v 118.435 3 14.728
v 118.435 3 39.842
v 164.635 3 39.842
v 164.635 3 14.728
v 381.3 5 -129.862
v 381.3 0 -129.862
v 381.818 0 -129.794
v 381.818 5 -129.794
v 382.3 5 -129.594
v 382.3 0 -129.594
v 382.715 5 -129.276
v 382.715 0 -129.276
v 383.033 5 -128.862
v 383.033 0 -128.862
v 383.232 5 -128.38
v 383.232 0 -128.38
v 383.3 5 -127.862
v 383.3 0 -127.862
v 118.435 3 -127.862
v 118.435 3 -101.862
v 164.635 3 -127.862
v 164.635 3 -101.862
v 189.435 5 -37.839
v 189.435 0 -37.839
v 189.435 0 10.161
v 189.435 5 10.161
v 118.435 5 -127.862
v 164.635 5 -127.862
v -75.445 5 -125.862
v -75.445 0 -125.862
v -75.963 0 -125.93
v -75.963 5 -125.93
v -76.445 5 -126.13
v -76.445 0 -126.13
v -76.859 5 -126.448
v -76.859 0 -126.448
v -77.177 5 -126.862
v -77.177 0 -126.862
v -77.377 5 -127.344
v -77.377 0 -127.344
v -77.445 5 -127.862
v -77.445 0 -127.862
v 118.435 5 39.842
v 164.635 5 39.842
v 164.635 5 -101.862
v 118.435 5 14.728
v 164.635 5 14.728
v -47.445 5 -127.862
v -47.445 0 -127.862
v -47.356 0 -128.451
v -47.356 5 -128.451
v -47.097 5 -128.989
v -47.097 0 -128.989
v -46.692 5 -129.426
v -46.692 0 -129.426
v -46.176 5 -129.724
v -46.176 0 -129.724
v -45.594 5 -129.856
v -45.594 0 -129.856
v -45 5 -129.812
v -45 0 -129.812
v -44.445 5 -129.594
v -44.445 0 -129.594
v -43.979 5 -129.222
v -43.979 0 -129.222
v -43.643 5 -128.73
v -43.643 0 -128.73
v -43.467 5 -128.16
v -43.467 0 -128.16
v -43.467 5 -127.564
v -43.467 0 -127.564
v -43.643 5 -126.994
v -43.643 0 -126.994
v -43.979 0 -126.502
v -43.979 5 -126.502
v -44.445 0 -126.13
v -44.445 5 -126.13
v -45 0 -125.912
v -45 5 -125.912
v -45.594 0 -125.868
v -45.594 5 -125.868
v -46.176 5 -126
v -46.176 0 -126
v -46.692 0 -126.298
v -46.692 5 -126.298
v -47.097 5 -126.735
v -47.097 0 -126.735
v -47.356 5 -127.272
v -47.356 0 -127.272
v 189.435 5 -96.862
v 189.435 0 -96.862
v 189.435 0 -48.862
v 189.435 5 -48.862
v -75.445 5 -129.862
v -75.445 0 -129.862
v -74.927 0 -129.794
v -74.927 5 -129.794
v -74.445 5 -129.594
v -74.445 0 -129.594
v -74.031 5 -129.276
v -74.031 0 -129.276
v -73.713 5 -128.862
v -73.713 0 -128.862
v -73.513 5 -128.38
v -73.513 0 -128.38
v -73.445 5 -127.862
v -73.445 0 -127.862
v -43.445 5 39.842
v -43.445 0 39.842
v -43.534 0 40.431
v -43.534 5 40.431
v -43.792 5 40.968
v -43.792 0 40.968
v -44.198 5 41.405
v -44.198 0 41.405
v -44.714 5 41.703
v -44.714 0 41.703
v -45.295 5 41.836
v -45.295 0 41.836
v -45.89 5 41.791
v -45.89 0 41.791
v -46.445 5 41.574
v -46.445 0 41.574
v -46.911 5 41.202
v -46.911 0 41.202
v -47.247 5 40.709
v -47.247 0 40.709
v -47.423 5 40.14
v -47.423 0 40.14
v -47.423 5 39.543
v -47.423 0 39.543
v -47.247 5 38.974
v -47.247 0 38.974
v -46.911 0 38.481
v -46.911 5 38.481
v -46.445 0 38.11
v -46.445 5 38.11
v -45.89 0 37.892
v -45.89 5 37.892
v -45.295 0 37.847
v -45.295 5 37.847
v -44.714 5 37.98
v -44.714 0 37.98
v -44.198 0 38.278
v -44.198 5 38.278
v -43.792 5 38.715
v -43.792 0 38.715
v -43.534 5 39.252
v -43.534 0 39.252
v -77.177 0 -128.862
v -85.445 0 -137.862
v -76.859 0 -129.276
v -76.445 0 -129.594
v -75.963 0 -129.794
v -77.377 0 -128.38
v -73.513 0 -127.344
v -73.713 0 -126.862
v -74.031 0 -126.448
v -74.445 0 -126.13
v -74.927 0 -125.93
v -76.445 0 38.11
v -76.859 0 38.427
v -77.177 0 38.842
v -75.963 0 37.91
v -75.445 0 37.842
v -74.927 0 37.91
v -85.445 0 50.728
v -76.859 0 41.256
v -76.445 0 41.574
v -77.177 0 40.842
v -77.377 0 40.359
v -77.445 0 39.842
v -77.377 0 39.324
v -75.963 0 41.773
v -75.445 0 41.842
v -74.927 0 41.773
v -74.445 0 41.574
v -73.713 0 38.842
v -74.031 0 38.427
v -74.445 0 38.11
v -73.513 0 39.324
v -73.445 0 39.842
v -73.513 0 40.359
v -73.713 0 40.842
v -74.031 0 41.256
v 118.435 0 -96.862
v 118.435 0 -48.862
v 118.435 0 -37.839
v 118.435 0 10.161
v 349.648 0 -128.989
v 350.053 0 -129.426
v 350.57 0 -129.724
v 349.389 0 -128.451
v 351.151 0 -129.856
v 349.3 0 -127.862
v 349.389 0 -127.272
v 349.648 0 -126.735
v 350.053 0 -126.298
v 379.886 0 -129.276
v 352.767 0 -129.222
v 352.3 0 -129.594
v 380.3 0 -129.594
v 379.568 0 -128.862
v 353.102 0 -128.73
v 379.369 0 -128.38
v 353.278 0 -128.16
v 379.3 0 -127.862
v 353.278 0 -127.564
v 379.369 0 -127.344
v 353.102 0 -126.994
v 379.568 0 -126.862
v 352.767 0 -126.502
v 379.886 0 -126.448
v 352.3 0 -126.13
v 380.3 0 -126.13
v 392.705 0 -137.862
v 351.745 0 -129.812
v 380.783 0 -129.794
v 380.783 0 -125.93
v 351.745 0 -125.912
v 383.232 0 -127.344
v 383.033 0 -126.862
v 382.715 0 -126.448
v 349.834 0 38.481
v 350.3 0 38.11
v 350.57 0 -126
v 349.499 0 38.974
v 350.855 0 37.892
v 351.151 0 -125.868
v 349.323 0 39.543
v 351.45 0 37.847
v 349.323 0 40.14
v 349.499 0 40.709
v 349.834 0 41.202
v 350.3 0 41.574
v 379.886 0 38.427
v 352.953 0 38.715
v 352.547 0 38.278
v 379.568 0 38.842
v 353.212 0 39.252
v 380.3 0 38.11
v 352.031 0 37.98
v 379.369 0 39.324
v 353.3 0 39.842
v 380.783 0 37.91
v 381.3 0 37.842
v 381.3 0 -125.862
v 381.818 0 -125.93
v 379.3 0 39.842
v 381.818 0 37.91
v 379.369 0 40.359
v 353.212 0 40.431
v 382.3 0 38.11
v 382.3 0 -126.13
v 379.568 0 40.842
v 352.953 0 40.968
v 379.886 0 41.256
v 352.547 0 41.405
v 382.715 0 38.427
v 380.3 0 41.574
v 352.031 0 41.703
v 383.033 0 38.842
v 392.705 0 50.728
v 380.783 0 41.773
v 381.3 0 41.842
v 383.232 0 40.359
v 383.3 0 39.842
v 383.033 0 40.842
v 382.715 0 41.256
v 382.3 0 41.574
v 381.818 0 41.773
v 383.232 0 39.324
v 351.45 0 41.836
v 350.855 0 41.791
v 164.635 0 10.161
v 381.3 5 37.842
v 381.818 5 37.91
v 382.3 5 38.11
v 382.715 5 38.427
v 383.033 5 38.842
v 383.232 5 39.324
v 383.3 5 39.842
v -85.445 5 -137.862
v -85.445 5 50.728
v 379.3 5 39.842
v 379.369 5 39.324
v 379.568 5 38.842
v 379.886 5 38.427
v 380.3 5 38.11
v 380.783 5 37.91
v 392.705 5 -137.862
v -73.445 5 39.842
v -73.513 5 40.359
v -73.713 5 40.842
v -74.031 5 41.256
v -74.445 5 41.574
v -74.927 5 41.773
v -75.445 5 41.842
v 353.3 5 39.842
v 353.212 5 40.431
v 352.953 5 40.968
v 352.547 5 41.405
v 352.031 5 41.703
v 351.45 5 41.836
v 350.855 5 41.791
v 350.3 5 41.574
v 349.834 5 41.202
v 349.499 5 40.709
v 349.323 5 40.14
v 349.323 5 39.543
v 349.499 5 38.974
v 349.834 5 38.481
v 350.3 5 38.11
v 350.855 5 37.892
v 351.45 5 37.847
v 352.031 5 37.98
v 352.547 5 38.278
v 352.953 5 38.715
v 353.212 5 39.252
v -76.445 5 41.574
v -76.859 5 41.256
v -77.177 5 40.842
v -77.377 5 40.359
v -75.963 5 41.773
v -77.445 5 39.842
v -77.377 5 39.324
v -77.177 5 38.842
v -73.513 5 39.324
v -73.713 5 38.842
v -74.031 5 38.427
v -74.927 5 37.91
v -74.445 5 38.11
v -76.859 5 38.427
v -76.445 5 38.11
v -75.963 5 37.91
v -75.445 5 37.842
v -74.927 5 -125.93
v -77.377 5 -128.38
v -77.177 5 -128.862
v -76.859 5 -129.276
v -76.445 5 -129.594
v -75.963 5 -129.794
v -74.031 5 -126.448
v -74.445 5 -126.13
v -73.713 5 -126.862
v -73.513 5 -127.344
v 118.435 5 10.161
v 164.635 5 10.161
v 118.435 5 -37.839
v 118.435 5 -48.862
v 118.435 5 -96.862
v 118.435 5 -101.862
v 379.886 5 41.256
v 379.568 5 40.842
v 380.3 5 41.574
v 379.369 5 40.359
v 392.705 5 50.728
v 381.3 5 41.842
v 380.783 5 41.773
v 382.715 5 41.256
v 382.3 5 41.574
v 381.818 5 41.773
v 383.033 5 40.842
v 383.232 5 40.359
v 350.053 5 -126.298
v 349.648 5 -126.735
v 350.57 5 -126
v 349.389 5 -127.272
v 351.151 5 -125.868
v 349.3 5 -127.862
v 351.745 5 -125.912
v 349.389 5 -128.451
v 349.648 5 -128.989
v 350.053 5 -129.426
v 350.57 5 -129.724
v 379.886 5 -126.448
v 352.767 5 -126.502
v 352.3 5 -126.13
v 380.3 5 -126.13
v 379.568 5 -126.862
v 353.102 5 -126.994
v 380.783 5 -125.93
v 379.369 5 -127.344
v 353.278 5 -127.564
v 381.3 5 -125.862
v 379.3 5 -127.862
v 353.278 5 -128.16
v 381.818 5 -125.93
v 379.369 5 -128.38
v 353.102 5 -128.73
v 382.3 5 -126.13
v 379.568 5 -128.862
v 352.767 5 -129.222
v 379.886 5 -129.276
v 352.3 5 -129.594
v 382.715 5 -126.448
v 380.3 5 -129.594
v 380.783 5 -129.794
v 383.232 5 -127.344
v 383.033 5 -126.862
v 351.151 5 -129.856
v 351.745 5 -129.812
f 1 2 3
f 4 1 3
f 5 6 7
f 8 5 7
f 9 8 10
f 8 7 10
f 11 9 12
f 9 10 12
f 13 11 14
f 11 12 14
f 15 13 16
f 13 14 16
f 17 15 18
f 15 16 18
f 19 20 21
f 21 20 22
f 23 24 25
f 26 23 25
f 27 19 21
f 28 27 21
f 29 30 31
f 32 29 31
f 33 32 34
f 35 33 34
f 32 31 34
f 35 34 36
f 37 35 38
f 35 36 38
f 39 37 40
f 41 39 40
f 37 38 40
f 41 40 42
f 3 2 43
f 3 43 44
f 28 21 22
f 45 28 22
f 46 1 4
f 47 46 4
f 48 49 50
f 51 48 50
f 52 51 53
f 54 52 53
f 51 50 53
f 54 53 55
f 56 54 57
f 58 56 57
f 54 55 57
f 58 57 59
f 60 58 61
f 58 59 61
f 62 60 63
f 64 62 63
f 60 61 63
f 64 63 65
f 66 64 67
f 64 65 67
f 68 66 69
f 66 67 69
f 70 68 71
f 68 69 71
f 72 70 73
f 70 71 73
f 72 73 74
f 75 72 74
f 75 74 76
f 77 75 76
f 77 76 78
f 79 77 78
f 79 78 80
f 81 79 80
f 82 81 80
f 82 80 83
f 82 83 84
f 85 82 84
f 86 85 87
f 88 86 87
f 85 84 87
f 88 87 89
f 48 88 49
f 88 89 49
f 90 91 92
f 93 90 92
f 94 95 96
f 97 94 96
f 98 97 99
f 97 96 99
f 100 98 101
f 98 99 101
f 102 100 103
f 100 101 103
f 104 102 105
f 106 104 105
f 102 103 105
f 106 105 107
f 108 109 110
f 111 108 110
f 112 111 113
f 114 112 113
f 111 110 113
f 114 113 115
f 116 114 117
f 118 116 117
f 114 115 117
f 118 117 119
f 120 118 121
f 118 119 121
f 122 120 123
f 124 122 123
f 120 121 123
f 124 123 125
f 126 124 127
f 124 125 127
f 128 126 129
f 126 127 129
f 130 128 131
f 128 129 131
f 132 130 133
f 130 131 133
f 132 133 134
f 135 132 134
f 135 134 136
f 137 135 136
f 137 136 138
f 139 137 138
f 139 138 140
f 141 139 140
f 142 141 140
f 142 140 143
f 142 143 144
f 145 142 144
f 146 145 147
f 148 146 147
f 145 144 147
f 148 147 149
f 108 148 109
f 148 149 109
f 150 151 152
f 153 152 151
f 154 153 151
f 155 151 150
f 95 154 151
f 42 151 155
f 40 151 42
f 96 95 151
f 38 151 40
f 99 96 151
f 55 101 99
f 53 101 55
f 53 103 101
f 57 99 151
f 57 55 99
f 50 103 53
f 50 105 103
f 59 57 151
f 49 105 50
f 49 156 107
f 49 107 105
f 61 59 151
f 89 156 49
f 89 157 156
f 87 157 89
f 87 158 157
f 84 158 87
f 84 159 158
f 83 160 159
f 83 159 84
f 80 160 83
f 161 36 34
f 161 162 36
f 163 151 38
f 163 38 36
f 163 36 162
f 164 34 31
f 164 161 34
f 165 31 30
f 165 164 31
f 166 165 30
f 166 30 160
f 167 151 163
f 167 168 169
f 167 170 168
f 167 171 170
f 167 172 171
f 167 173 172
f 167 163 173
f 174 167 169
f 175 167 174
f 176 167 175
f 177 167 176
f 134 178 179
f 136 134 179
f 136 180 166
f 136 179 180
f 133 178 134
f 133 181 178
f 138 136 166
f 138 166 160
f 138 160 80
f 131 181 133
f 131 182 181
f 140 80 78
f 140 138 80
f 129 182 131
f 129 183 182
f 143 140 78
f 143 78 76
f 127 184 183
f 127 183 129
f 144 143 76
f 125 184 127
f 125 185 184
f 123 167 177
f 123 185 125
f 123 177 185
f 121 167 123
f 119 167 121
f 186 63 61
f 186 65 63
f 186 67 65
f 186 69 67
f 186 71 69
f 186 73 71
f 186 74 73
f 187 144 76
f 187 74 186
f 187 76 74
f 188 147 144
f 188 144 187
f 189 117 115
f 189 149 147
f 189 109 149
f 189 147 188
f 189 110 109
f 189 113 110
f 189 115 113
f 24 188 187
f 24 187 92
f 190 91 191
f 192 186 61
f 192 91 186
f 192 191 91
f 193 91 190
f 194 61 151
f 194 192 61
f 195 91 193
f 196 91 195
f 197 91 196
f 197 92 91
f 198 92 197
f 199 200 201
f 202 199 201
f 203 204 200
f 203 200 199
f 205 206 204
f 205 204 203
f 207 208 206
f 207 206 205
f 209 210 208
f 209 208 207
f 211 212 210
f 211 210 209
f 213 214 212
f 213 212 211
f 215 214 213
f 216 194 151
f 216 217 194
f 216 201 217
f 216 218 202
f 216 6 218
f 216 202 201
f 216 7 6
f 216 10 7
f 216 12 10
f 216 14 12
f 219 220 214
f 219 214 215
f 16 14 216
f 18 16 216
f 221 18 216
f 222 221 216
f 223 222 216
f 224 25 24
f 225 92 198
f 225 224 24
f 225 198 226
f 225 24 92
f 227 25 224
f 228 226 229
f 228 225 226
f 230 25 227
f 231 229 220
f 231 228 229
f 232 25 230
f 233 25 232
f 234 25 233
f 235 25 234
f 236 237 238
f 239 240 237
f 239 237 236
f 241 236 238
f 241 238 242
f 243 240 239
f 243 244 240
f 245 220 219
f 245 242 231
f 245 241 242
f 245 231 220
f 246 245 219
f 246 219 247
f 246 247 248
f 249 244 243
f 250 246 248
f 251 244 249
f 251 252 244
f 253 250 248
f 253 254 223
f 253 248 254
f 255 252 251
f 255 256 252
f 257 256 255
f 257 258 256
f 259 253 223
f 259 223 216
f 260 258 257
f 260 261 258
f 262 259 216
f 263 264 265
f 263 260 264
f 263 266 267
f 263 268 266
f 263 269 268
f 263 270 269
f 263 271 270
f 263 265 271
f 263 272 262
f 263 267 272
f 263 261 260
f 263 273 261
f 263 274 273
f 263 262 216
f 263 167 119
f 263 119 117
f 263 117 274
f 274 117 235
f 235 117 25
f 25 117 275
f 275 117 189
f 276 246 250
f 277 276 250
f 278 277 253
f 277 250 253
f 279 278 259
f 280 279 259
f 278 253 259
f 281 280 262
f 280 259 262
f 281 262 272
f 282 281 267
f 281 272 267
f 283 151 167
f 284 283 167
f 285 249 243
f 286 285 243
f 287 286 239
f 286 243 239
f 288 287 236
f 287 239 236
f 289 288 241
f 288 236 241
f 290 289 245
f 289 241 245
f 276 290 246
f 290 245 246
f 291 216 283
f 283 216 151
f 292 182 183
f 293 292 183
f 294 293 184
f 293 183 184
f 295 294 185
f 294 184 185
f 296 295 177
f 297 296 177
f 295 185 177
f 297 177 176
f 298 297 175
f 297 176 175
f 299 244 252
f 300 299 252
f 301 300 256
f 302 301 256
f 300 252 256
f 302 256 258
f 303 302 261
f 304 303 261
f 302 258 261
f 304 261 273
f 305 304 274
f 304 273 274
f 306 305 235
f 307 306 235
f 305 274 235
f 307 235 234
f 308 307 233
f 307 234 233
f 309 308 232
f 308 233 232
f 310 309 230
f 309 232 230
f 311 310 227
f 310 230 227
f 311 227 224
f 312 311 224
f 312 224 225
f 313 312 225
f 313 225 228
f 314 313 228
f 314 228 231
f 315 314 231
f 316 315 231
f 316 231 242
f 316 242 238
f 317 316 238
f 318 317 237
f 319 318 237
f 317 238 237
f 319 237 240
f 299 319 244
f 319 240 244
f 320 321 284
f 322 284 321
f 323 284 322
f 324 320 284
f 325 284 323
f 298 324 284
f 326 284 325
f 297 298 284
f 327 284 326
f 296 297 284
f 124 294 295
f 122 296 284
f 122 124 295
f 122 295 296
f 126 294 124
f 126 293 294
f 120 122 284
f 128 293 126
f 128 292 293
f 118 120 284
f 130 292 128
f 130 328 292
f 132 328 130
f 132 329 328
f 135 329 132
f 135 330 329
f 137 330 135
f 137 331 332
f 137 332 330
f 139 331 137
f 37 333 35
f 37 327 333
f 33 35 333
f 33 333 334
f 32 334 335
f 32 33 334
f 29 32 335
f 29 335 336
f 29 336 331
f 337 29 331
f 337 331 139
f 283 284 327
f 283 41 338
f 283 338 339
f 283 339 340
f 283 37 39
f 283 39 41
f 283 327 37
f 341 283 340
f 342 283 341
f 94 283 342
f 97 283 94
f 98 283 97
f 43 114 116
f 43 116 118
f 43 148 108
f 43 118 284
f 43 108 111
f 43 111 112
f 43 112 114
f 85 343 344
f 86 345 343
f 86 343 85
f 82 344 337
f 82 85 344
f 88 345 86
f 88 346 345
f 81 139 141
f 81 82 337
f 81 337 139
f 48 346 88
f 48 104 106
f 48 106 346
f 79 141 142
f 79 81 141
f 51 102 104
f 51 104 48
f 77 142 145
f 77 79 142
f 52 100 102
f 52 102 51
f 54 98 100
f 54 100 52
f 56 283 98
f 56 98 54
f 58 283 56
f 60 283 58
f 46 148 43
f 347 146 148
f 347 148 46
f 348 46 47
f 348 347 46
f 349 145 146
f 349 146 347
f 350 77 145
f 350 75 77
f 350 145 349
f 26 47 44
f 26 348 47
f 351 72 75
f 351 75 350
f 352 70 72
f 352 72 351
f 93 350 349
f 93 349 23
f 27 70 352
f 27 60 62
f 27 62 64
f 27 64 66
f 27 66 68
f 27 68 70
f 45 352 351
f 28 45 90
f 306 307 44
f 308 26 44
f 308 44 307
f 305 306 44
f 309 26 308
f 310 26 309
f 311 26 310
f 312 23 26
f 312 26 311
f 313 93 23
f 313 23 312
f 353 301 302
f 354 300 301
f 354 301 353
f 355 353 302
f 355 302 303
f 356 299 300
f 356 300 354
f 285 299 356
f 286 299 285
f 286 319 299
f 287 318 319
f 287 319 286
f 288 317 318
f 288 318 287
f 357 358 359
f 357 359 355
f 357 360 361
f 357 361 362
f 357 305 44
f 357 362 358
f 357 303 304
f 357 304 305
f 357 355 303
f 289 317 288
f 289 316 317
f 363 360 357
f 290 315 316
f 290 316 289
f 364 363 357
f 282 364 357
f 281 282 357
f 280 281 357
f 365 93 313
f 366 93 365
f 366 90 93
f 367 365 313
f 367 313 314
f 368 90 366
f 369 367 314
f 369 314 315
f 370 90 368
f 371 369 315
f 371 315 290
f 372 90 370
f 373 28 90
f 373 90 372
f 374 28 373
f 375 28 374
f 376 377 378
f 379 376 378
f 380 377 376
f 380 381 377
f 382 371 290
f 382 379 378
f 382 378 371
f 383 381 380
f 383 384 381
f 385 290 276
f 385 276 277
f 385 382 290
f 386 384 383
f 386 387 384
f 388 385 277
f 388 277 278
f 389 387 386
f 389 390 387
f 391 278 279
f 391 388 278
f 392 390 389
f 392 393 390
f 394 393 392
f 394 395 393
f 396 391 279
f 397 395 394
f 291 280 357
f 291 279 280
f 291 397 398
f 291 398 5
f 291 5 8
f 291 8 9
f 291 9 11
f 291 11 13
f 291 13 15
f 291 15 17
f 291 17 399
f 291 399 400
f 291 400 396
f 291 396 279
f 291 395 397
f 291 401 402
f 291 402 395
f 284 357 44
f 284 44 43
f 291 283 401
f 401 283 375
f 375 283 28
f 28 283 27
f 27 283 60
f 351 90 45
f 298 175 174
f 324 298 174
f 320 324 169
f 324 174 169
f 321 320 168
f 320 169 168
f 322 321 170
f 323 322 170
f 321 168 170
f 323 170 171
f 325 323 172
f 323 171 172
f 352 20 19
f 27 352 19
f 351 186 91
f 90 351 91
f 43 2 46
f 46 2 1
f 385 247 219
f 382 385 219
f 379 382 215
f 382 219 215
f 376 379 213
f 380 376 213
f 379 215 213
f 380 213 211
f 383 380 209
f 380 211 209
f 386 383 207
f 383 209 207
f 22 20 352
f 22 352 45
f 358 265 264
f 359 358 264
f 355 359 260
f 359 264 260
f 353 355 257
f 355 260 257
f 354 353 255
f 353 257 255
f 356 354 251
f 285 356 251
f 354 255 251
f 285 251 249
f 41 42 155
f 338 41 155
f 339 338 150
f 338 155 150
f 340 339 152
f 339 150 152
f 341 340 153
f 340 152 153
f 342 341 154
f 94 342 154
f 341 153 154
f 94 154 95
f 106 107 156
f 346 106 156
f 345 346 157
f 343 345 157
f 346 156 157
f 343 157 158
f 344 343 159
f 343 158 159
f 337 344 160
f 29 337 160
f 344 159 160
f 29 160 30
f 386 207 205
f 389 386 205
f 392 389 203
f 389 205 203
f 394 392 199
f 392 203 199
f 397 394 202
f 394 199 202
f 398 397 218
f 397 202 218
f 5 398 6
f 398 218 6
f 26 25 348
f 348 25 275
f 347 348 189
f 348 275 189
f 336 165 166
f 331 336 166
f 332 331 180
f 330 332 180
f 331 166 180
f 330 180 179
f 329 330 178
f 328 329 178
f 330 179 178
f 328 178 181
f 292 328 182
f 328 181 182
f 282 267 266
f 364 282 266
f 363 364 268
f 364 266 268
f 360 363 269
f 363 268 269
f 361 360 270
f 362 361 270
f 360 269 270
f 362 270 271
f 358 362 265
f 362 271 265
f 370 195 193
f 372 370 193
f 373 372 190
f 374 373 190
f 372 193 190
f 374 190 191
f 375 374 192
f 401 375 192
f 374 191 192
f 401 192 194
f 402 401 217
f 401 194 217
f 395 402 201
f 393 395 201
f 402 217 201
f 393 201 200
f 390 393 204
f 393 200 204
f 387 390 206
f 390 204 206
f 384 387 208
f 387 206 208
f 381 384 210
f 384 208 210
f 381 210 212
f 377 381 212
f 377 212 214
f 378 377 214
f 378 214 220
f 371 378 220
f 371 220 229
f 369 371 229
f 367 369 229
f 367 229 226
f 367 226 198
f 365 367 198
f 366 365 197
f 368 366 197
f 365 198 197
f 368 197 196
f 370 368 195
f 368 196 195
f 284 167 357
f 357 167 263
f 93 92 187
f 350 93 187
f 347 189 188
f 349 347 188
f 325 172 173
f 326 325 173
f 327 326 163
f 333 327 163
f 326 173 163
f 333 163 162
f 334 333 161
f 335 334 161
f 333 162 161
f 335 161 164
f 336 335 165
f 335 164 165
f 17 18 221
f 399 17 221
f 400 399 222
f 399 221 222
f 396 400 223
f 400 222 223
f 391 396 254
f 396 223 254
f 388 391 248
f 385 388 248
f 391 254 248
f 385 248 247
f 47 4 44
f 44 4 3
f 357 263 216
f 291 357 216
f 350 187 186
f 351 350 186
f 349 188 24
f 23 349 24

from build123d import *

# Parameters (mm, degrees)
ESQUISSE2_W        = 46.2
ESQUISSE2_H        = 5
ESQUISSE2_H_2      = 8
ESQUISSE2_H_3      = 8.88649877
ESQUISSE2_H_4      = 2
ESQUISSE2_H_5      = 4.567327767
BOSS_EXTRU_1_DEPTH = 5
ESQUISSE3_W        = 46.2
ESQUISSE3_H        = 25.11350123
ESQUISSE3_H_2      = 26
BOSS_EXTRU_2_DEPTH = 3


with BuildPart() as part:
    # Esquisse2 → Boss.-Extru.1 (new body)
    with BuildSketch(Plane(origin=(0, 0, 0), x_dir=(1, 0, 0), z_dir=(0, 1, 0))):
        with BuildLine():
            Line((-75.44494324, 137.861939651), (-85.44494324, 137.861939651))
            Line((-85.44494324, 137.861939651), (-85.44494324, 127.861939651))
            Line((-85.44494324, 127.861939651), (-77.44494324, 127.861939651))
            ThreePointArc((-77.44494324, 127.861939651), (-76.859156802, 129.276153213), (-75.44494324, 129.861939651))
            Line((-75.44494324, 129.861939651), (-75.44494324, 137.861939651))
        make_face()
        with BuildLine():
            Line((-77.44494324, 127.861939651), (-85.44494324, 127.861939651))
            Line((-85.44494324, 127.861939651), (-85.44494324, -39.841561579))
            Line((-85.44494324, -39.841561579), (-77.44494324, -39.841561579))
            ThreePointArc((-77.44494324, -39.841561579), (-76.859156802, -38.427348016), (-75.44494324, -37.841561579))
            Line((-75.44494324, -37.841561579), (-75.44494324, 125.861939651))
            ThreePointArc((-75.44494324, 125.861939651), (-76.859156802, 126.447726088), (-77.44494324, 127.861939651))
        make_face()
        with BuildLine():
            Line((-70.44494324, 127.861939651), (-73.44494324, 127.861939651))
            ThreePointArc((-73.44494324, 127.861939651), (-74.030729678, 126.447726088), (-75.44494324, 125.861939651))
            Line((-75.44494324, 125.861939651), (-75.44494324, -37.841561579))
            ThreePointArc((-75.44494324, -37.841561579), (-74.030729678, -38.427348016), (-73.44494324, -39.841561579))
            Line((-73.44494324, -39.841561579), (-70.44494324, -39.841561579))
            Line((-70.44494324, -39.841561579), (-70.44494324, 127.861939651))
        make_face()
        with BuildLine():
            Line((118.43505676, 101.861939651), (118.43505676, 127.861939651))
            Line((118.43505676, 127.861939651), (-43.44494324, 127.861939651))
            ThreePointArc((-43.44494324, 127.861939651), (-45.44494324, 125.861939651), (-47.44494324, 127.861939651))
            Line((-47.44494324, 127.861939651), (-70.44494324, 127.861939651))
            Line((-70.44494324, 127.861939651), (-70.44494324, -39.841561579))
            Line((-70.44494324, -39.841561579), (-47.44494324, -39.841561579))
            ThreePointArc((-47.44494324, -39.841561579), (-45.44494324, -37.841561579), (-43.44494324, -39.841561579))
            Line((-43.44494324, -39.841561579), (118.43505676, -39.841561579))
            Line((118.43505676, -39.841561579), (118.43505676, -35.312608687))
            Line((118.43505676, -35.312608687), (118.43505676, -14.728060349))
            Line((118.43505676, -14.728060349), (118.43505676, -10.160732582))
            Line((118.43505676, -10.160732582), (118.43505676, 33.566939651))
            Line((118.43505676, 33.566939651), (118.43505676, 37.839267418))
            Line((118.43505676, 37.839267418), (118.43505676, 48.861939651))
            Line((118.43505676, 48.861939651), (118.43505676, 53.566939651))
            Line((118.43505676, 53.566939651), (118.43505676, 96.861939651))
            Line((118.43505676, 96.861939651), (118.43505676, 101.861939651))
        make_face()
        with BuildLine():
            Line((-77.44494324, -39.841561579), (-85.44494324, -39.841561579))
            Line((-85.44494324, -39.841561579), (-85.44494324, -50.728060349))
            Line((-85.44494324, -50.728060349), (-75.44494324, -50.728060349))
            Line((-75.44494324, -50.728060349), (-75.44494324, -41.841561579))
            ThreePointArc((-75.44494324, -41.841561579), (-76.859156802, -41.255775141), (-77.44494324, -39.841561579))
        make_face()
        with BuildLine():
            Line((-75.44494324, -41.841561579), (-75.44494324, -50.728060349))
            Line((-75.44494324, -50.728060349), (118.43505676, -50.728060349))
            Line((118.43505676, -50.728060349), (118.43505676, -48.728060349))
            Line((118.43505676, -48.728060349), (118.43505676, -39.841561579))
            Line((118.43505676, -39.841561579), (-43.44494324, -39.841561579))
            ThreePointArc((-43.44494324, -39.841561579), (-45.44494324, -41.841561579), (-47.44494324, -39.841561579))
            Line((-47.44494324, -39.841561579), (-70.44494324, -39.841561579))
            Line((-70.44494324, -39.841561579), (-73.44494324, -39.841561579))
            ThreePointArc((-73.44494324, -39.841561579), (-74.030729678, -41.255775141), (-75.44494324, -41.841561579))
        make_face()
        with BuildLine():
            Line((349.300456076, 127.861939651), (164.63505676, 127.861939651))
            Line((164.63505676, 127.861939651), (164.63505676, 101.861939651))
            Line((164.63505676, 101.861939651), (164.63505676, 96.861939651))
            Line((164.63505676, 96.861939651), (189.43505676, 96.861939651))
            Line((189.43505676, 96.861939651), (189.43505676, 48.861939651))
            Line((189.43505676, 48.861939651), (164.63505676, 48.861939651))
            Line((164.63505676, 48.861939651), (164.63505676, 43.566939651))
            Line((164.63505676, 43.566939651), (164.63505676, 37.839267418))
            Line((164.63505676, 37.839267418), (189.43505676, 37.839267418))
            Line((189.43505676, 37.839267418), (189.43505676, -10.160732582))
            Line((189.43505676, -10.160732582), (164.63505676, -10.160732582))
            Line((164.63505676, -10.160732582), (164.63505676, -14.728060349))
            Line((164.63505676, -14.728060349), (164.63505676, -39.841561579))
            Line((164.63505676, -39.841561579), (349.300456076, -39.841561579))
            ThreePointArc((349.300456076, -39.841561579), (351.300456076, -37.841561579), (353.300456076, -39.841561579))
            Line((353.300456076, -39.841561579), (377.70505676, -39.841561579))
            Line((377.70505676, -39.841561579), (377.70505676, 127.861939651))
            Line((377.70505676, 127.861939651), (353.300456076, 127.861939651))
            ThreePointArc((353.300456076, 127.861939651), (351.300456076, 125.861939651), (349.300456076, 127.861939651))
        make_face()
        with BuildLine():
            Line((381.300456076, 137.861939651), (118.43505676, 137.861939651))
            Line((118.43505676, 137.861939651), (118.43505676, 135.861939651))
            Line((118.43505676, 135.861939651), (164.63505676, 135.861939651))
            Line((164.63505676, 135.861939651), (164.63505676, 127.861939651))
            Line((164.63505676, 127.861939651), (349.300456076, 127.861939651))
            ThreePointArc((349.300456076, 127.861939651), (351.300456076, 129.861939651), (353.300456076, 127.861939651))
            Line((353.300456076, 127.861939651), (377.70505676, 127.861939651))
            Line((377.70505676, 127.861939651), (379.300456076, 127.861939651))
            ThreePointArc((379.300456076, 127.861939651), (379.886242514, 129.276153213), (381.300456076, 129.861939651))
            Line((381.300456076, 129.861939651), (381.300456076, 137.861939651))
        make_face()
        with BuildLine():
            Line((392.70505676, -39.841561579), (392.70505676, 127.861939651))
            Line((392.70505676, 127.861939651), (383.300456076, 127.861939651))
            ThreePointArc((383.300456076, 127.861939651), (382.714669639, 126.447726088), (381.300456076, 125.861939651))
            Line((381.300456076, 125.861939651), (381.300456076, -37.841561579))
            ThreePointArc((381.300456076, -37.841561579), (382.714669639, -38.427348016), (383.300456076, -39.841561579))
            Line((383.300456076, -39.841561579), (392.70505676, -39.841561579))
        make_face()
        with BuildLine():
            Line((392.70505676, 137.861939651), (381.300456076, 137.861939651))
            Line((381.300456076, 137.861939651), (381.300456076, 129.861939651))
            ThreePointArc((381.300456076, 129.861939651), (382.714669639, 129.276153213), (383.300456076, 127.861939651))
            Line((383.300456076, 127.861939651), (392.70505676, 127.861939651))
            Line((392.70505676, 127.861939651), (392.70505676, 137.861939651))
        make_face()
        Polygon((164.63505676, 48.861939651), (118.43505676, 48.861939651), (118.43505676, 37.839267418), (164.63505676, 37.839267418), (164.63505676, 43.566939651), align=None)
        with Locations((141.53505676, 99.361939651)):
            Rectangle(ESQUISSE2_W, ESQUISSE2_H)
        with Locations((141.53505676, 131.861939651)):
            Rectangle(ESQUISSE2_W, ESQUISSE2_H_2)
        with BuildLine():
            Line((118.43505676, 137.861939651), (-75.44494324, 137.861939651))
            Line((-75.44494324, 137.861939651), (-75.44494324, 129.861939651))
            ThreePointArc((-75.44494324, 129.861939651), (-74.030729678, 129.276153213), (-73.44494324, 127.861939651))
            Line((-73.44494324, 127.861939651), (-70.44494324, 127.861939651))
            Line((-70.44494324, 127.861939651), (-47.44494324, 127.861939651))
            ThreePointArc((-47.44494324, 127.861939651), (-45.44494324, 129.861939651), (-43.44494324, 127.861939651))
            Line((-43.44494324, 127.861939651), (118.43505676, 127.861939651))
            Line((118.43505676, 127.861939651), (118.43505676, 135.861939651))
            Line((118.43505676, 135.861939651), (118.43505676, 137.861939651))
        make_face()
        with Locations((141.53505676, -44.284810964)):
            Rectangle(ESQUISSE2_W, ESQUISSE2_H_3)
        with Locations((141.53505676, -49.728060349)):
            Rectangle(ESQUISSE2_W, ESQUISSE2_H_4)
        with BuildLine():
            Line((164.63505676, -48.728060349), (164.63505676, -50.728060349))
            Line((164.63505676, -50.728060349), (377.70505676, -50.728060349))
            Line((377.70505676, -50.728060349), (377.70505676, -39.841561579))
            Line((377.70505676, -39.841561579), (353.300456076, -39.841561579))
            ThreePointArc((353.300456076, -39.841561579), (351.300456076, -41.841561579), (349.300456076, -39.841561579))
            Line((349.300456076, -39.841561579), (164.63505676, -39.841561579))
            Line((164.63505676, -39.841561579), (164.63505676, -48.728060349))
        make_face()
        with Locations((141.53505676, -12.444396466)):
            Rectangle(ESQUISSE2_W, ESQUISSE2_H_5)
        with BuildLine():
            Line((379.300456076, -39.841561579), (377.70505676, -39.841561579))
            Line((377.70505676, -39.841561579), (377.70505676, -50.728060349))
            Line((377.70505676, -50.728060349), (381.300456076, -50.728060349))
            Line((381.300456076, -50.728060349), (381.300456076, -41.841561579))
            ThreePointArc((381.300456076, -41.841561579), (379.886242514, -41.255775141), (379.300456076, -39.841561579))
        make_face()
        with BuildLine():
            Line((392.70505676, -50.728060349), (392.70505676, -39.841561579))
            Line((392.70505676, -39.841561579), (383.300456076, -39.841561579))
            ThreePointArc((383.300456076, -39.841561579), (382.714669639, -41.255775141), (381.300456076, -41.841561579))
            Line((381.300456076, -41.841561579), (381.300456076, -50.728060349))
            Line((381.300456076, -50.728060349), (392.70505676, -50.728060349))
        make_face()
        with BuildLine():
            ThreePointArc((381.300456076, 125.861939651), (379.886242514, 126.447726088), (379.300456076, 127.861939651))
            Line((379.300456076, 127.861939651), (377.70505676, 127.861939651))
            Line((377.70505676, 127.861939651), (377.70505676, -39.841561579))
            Line((377.70505676, -39.841561579), (379.300456076, -39.841561579))
            ThreePointArc((379.300456076, -39.841561579), (379.886242514, -38.427348016), (381.300456076, -37.841561579))
            Line((381.300456076, -37.841561579), (381.300456076, 125.861939651))
        make_face()
    extrude(amount=BOSS_EXTRU_1_DEPTH)

    # Esquisse3 → Boss.-Extru.2 (add)
    with BuildSketch(Plane.XZ):
        with Locations((141.53505676, 27.284810964)):
            Rectangle(ESQUISSE3_W, ESQUISSE3_H)
        with Locations((141.53505676, -114.861939651)):
            Rectangle(ESQUISSE3_W, ESQUISSE3_H_2)
    extrude(amount=-BOSS_EXTRU_2_DEPTH)


solid = part.part
